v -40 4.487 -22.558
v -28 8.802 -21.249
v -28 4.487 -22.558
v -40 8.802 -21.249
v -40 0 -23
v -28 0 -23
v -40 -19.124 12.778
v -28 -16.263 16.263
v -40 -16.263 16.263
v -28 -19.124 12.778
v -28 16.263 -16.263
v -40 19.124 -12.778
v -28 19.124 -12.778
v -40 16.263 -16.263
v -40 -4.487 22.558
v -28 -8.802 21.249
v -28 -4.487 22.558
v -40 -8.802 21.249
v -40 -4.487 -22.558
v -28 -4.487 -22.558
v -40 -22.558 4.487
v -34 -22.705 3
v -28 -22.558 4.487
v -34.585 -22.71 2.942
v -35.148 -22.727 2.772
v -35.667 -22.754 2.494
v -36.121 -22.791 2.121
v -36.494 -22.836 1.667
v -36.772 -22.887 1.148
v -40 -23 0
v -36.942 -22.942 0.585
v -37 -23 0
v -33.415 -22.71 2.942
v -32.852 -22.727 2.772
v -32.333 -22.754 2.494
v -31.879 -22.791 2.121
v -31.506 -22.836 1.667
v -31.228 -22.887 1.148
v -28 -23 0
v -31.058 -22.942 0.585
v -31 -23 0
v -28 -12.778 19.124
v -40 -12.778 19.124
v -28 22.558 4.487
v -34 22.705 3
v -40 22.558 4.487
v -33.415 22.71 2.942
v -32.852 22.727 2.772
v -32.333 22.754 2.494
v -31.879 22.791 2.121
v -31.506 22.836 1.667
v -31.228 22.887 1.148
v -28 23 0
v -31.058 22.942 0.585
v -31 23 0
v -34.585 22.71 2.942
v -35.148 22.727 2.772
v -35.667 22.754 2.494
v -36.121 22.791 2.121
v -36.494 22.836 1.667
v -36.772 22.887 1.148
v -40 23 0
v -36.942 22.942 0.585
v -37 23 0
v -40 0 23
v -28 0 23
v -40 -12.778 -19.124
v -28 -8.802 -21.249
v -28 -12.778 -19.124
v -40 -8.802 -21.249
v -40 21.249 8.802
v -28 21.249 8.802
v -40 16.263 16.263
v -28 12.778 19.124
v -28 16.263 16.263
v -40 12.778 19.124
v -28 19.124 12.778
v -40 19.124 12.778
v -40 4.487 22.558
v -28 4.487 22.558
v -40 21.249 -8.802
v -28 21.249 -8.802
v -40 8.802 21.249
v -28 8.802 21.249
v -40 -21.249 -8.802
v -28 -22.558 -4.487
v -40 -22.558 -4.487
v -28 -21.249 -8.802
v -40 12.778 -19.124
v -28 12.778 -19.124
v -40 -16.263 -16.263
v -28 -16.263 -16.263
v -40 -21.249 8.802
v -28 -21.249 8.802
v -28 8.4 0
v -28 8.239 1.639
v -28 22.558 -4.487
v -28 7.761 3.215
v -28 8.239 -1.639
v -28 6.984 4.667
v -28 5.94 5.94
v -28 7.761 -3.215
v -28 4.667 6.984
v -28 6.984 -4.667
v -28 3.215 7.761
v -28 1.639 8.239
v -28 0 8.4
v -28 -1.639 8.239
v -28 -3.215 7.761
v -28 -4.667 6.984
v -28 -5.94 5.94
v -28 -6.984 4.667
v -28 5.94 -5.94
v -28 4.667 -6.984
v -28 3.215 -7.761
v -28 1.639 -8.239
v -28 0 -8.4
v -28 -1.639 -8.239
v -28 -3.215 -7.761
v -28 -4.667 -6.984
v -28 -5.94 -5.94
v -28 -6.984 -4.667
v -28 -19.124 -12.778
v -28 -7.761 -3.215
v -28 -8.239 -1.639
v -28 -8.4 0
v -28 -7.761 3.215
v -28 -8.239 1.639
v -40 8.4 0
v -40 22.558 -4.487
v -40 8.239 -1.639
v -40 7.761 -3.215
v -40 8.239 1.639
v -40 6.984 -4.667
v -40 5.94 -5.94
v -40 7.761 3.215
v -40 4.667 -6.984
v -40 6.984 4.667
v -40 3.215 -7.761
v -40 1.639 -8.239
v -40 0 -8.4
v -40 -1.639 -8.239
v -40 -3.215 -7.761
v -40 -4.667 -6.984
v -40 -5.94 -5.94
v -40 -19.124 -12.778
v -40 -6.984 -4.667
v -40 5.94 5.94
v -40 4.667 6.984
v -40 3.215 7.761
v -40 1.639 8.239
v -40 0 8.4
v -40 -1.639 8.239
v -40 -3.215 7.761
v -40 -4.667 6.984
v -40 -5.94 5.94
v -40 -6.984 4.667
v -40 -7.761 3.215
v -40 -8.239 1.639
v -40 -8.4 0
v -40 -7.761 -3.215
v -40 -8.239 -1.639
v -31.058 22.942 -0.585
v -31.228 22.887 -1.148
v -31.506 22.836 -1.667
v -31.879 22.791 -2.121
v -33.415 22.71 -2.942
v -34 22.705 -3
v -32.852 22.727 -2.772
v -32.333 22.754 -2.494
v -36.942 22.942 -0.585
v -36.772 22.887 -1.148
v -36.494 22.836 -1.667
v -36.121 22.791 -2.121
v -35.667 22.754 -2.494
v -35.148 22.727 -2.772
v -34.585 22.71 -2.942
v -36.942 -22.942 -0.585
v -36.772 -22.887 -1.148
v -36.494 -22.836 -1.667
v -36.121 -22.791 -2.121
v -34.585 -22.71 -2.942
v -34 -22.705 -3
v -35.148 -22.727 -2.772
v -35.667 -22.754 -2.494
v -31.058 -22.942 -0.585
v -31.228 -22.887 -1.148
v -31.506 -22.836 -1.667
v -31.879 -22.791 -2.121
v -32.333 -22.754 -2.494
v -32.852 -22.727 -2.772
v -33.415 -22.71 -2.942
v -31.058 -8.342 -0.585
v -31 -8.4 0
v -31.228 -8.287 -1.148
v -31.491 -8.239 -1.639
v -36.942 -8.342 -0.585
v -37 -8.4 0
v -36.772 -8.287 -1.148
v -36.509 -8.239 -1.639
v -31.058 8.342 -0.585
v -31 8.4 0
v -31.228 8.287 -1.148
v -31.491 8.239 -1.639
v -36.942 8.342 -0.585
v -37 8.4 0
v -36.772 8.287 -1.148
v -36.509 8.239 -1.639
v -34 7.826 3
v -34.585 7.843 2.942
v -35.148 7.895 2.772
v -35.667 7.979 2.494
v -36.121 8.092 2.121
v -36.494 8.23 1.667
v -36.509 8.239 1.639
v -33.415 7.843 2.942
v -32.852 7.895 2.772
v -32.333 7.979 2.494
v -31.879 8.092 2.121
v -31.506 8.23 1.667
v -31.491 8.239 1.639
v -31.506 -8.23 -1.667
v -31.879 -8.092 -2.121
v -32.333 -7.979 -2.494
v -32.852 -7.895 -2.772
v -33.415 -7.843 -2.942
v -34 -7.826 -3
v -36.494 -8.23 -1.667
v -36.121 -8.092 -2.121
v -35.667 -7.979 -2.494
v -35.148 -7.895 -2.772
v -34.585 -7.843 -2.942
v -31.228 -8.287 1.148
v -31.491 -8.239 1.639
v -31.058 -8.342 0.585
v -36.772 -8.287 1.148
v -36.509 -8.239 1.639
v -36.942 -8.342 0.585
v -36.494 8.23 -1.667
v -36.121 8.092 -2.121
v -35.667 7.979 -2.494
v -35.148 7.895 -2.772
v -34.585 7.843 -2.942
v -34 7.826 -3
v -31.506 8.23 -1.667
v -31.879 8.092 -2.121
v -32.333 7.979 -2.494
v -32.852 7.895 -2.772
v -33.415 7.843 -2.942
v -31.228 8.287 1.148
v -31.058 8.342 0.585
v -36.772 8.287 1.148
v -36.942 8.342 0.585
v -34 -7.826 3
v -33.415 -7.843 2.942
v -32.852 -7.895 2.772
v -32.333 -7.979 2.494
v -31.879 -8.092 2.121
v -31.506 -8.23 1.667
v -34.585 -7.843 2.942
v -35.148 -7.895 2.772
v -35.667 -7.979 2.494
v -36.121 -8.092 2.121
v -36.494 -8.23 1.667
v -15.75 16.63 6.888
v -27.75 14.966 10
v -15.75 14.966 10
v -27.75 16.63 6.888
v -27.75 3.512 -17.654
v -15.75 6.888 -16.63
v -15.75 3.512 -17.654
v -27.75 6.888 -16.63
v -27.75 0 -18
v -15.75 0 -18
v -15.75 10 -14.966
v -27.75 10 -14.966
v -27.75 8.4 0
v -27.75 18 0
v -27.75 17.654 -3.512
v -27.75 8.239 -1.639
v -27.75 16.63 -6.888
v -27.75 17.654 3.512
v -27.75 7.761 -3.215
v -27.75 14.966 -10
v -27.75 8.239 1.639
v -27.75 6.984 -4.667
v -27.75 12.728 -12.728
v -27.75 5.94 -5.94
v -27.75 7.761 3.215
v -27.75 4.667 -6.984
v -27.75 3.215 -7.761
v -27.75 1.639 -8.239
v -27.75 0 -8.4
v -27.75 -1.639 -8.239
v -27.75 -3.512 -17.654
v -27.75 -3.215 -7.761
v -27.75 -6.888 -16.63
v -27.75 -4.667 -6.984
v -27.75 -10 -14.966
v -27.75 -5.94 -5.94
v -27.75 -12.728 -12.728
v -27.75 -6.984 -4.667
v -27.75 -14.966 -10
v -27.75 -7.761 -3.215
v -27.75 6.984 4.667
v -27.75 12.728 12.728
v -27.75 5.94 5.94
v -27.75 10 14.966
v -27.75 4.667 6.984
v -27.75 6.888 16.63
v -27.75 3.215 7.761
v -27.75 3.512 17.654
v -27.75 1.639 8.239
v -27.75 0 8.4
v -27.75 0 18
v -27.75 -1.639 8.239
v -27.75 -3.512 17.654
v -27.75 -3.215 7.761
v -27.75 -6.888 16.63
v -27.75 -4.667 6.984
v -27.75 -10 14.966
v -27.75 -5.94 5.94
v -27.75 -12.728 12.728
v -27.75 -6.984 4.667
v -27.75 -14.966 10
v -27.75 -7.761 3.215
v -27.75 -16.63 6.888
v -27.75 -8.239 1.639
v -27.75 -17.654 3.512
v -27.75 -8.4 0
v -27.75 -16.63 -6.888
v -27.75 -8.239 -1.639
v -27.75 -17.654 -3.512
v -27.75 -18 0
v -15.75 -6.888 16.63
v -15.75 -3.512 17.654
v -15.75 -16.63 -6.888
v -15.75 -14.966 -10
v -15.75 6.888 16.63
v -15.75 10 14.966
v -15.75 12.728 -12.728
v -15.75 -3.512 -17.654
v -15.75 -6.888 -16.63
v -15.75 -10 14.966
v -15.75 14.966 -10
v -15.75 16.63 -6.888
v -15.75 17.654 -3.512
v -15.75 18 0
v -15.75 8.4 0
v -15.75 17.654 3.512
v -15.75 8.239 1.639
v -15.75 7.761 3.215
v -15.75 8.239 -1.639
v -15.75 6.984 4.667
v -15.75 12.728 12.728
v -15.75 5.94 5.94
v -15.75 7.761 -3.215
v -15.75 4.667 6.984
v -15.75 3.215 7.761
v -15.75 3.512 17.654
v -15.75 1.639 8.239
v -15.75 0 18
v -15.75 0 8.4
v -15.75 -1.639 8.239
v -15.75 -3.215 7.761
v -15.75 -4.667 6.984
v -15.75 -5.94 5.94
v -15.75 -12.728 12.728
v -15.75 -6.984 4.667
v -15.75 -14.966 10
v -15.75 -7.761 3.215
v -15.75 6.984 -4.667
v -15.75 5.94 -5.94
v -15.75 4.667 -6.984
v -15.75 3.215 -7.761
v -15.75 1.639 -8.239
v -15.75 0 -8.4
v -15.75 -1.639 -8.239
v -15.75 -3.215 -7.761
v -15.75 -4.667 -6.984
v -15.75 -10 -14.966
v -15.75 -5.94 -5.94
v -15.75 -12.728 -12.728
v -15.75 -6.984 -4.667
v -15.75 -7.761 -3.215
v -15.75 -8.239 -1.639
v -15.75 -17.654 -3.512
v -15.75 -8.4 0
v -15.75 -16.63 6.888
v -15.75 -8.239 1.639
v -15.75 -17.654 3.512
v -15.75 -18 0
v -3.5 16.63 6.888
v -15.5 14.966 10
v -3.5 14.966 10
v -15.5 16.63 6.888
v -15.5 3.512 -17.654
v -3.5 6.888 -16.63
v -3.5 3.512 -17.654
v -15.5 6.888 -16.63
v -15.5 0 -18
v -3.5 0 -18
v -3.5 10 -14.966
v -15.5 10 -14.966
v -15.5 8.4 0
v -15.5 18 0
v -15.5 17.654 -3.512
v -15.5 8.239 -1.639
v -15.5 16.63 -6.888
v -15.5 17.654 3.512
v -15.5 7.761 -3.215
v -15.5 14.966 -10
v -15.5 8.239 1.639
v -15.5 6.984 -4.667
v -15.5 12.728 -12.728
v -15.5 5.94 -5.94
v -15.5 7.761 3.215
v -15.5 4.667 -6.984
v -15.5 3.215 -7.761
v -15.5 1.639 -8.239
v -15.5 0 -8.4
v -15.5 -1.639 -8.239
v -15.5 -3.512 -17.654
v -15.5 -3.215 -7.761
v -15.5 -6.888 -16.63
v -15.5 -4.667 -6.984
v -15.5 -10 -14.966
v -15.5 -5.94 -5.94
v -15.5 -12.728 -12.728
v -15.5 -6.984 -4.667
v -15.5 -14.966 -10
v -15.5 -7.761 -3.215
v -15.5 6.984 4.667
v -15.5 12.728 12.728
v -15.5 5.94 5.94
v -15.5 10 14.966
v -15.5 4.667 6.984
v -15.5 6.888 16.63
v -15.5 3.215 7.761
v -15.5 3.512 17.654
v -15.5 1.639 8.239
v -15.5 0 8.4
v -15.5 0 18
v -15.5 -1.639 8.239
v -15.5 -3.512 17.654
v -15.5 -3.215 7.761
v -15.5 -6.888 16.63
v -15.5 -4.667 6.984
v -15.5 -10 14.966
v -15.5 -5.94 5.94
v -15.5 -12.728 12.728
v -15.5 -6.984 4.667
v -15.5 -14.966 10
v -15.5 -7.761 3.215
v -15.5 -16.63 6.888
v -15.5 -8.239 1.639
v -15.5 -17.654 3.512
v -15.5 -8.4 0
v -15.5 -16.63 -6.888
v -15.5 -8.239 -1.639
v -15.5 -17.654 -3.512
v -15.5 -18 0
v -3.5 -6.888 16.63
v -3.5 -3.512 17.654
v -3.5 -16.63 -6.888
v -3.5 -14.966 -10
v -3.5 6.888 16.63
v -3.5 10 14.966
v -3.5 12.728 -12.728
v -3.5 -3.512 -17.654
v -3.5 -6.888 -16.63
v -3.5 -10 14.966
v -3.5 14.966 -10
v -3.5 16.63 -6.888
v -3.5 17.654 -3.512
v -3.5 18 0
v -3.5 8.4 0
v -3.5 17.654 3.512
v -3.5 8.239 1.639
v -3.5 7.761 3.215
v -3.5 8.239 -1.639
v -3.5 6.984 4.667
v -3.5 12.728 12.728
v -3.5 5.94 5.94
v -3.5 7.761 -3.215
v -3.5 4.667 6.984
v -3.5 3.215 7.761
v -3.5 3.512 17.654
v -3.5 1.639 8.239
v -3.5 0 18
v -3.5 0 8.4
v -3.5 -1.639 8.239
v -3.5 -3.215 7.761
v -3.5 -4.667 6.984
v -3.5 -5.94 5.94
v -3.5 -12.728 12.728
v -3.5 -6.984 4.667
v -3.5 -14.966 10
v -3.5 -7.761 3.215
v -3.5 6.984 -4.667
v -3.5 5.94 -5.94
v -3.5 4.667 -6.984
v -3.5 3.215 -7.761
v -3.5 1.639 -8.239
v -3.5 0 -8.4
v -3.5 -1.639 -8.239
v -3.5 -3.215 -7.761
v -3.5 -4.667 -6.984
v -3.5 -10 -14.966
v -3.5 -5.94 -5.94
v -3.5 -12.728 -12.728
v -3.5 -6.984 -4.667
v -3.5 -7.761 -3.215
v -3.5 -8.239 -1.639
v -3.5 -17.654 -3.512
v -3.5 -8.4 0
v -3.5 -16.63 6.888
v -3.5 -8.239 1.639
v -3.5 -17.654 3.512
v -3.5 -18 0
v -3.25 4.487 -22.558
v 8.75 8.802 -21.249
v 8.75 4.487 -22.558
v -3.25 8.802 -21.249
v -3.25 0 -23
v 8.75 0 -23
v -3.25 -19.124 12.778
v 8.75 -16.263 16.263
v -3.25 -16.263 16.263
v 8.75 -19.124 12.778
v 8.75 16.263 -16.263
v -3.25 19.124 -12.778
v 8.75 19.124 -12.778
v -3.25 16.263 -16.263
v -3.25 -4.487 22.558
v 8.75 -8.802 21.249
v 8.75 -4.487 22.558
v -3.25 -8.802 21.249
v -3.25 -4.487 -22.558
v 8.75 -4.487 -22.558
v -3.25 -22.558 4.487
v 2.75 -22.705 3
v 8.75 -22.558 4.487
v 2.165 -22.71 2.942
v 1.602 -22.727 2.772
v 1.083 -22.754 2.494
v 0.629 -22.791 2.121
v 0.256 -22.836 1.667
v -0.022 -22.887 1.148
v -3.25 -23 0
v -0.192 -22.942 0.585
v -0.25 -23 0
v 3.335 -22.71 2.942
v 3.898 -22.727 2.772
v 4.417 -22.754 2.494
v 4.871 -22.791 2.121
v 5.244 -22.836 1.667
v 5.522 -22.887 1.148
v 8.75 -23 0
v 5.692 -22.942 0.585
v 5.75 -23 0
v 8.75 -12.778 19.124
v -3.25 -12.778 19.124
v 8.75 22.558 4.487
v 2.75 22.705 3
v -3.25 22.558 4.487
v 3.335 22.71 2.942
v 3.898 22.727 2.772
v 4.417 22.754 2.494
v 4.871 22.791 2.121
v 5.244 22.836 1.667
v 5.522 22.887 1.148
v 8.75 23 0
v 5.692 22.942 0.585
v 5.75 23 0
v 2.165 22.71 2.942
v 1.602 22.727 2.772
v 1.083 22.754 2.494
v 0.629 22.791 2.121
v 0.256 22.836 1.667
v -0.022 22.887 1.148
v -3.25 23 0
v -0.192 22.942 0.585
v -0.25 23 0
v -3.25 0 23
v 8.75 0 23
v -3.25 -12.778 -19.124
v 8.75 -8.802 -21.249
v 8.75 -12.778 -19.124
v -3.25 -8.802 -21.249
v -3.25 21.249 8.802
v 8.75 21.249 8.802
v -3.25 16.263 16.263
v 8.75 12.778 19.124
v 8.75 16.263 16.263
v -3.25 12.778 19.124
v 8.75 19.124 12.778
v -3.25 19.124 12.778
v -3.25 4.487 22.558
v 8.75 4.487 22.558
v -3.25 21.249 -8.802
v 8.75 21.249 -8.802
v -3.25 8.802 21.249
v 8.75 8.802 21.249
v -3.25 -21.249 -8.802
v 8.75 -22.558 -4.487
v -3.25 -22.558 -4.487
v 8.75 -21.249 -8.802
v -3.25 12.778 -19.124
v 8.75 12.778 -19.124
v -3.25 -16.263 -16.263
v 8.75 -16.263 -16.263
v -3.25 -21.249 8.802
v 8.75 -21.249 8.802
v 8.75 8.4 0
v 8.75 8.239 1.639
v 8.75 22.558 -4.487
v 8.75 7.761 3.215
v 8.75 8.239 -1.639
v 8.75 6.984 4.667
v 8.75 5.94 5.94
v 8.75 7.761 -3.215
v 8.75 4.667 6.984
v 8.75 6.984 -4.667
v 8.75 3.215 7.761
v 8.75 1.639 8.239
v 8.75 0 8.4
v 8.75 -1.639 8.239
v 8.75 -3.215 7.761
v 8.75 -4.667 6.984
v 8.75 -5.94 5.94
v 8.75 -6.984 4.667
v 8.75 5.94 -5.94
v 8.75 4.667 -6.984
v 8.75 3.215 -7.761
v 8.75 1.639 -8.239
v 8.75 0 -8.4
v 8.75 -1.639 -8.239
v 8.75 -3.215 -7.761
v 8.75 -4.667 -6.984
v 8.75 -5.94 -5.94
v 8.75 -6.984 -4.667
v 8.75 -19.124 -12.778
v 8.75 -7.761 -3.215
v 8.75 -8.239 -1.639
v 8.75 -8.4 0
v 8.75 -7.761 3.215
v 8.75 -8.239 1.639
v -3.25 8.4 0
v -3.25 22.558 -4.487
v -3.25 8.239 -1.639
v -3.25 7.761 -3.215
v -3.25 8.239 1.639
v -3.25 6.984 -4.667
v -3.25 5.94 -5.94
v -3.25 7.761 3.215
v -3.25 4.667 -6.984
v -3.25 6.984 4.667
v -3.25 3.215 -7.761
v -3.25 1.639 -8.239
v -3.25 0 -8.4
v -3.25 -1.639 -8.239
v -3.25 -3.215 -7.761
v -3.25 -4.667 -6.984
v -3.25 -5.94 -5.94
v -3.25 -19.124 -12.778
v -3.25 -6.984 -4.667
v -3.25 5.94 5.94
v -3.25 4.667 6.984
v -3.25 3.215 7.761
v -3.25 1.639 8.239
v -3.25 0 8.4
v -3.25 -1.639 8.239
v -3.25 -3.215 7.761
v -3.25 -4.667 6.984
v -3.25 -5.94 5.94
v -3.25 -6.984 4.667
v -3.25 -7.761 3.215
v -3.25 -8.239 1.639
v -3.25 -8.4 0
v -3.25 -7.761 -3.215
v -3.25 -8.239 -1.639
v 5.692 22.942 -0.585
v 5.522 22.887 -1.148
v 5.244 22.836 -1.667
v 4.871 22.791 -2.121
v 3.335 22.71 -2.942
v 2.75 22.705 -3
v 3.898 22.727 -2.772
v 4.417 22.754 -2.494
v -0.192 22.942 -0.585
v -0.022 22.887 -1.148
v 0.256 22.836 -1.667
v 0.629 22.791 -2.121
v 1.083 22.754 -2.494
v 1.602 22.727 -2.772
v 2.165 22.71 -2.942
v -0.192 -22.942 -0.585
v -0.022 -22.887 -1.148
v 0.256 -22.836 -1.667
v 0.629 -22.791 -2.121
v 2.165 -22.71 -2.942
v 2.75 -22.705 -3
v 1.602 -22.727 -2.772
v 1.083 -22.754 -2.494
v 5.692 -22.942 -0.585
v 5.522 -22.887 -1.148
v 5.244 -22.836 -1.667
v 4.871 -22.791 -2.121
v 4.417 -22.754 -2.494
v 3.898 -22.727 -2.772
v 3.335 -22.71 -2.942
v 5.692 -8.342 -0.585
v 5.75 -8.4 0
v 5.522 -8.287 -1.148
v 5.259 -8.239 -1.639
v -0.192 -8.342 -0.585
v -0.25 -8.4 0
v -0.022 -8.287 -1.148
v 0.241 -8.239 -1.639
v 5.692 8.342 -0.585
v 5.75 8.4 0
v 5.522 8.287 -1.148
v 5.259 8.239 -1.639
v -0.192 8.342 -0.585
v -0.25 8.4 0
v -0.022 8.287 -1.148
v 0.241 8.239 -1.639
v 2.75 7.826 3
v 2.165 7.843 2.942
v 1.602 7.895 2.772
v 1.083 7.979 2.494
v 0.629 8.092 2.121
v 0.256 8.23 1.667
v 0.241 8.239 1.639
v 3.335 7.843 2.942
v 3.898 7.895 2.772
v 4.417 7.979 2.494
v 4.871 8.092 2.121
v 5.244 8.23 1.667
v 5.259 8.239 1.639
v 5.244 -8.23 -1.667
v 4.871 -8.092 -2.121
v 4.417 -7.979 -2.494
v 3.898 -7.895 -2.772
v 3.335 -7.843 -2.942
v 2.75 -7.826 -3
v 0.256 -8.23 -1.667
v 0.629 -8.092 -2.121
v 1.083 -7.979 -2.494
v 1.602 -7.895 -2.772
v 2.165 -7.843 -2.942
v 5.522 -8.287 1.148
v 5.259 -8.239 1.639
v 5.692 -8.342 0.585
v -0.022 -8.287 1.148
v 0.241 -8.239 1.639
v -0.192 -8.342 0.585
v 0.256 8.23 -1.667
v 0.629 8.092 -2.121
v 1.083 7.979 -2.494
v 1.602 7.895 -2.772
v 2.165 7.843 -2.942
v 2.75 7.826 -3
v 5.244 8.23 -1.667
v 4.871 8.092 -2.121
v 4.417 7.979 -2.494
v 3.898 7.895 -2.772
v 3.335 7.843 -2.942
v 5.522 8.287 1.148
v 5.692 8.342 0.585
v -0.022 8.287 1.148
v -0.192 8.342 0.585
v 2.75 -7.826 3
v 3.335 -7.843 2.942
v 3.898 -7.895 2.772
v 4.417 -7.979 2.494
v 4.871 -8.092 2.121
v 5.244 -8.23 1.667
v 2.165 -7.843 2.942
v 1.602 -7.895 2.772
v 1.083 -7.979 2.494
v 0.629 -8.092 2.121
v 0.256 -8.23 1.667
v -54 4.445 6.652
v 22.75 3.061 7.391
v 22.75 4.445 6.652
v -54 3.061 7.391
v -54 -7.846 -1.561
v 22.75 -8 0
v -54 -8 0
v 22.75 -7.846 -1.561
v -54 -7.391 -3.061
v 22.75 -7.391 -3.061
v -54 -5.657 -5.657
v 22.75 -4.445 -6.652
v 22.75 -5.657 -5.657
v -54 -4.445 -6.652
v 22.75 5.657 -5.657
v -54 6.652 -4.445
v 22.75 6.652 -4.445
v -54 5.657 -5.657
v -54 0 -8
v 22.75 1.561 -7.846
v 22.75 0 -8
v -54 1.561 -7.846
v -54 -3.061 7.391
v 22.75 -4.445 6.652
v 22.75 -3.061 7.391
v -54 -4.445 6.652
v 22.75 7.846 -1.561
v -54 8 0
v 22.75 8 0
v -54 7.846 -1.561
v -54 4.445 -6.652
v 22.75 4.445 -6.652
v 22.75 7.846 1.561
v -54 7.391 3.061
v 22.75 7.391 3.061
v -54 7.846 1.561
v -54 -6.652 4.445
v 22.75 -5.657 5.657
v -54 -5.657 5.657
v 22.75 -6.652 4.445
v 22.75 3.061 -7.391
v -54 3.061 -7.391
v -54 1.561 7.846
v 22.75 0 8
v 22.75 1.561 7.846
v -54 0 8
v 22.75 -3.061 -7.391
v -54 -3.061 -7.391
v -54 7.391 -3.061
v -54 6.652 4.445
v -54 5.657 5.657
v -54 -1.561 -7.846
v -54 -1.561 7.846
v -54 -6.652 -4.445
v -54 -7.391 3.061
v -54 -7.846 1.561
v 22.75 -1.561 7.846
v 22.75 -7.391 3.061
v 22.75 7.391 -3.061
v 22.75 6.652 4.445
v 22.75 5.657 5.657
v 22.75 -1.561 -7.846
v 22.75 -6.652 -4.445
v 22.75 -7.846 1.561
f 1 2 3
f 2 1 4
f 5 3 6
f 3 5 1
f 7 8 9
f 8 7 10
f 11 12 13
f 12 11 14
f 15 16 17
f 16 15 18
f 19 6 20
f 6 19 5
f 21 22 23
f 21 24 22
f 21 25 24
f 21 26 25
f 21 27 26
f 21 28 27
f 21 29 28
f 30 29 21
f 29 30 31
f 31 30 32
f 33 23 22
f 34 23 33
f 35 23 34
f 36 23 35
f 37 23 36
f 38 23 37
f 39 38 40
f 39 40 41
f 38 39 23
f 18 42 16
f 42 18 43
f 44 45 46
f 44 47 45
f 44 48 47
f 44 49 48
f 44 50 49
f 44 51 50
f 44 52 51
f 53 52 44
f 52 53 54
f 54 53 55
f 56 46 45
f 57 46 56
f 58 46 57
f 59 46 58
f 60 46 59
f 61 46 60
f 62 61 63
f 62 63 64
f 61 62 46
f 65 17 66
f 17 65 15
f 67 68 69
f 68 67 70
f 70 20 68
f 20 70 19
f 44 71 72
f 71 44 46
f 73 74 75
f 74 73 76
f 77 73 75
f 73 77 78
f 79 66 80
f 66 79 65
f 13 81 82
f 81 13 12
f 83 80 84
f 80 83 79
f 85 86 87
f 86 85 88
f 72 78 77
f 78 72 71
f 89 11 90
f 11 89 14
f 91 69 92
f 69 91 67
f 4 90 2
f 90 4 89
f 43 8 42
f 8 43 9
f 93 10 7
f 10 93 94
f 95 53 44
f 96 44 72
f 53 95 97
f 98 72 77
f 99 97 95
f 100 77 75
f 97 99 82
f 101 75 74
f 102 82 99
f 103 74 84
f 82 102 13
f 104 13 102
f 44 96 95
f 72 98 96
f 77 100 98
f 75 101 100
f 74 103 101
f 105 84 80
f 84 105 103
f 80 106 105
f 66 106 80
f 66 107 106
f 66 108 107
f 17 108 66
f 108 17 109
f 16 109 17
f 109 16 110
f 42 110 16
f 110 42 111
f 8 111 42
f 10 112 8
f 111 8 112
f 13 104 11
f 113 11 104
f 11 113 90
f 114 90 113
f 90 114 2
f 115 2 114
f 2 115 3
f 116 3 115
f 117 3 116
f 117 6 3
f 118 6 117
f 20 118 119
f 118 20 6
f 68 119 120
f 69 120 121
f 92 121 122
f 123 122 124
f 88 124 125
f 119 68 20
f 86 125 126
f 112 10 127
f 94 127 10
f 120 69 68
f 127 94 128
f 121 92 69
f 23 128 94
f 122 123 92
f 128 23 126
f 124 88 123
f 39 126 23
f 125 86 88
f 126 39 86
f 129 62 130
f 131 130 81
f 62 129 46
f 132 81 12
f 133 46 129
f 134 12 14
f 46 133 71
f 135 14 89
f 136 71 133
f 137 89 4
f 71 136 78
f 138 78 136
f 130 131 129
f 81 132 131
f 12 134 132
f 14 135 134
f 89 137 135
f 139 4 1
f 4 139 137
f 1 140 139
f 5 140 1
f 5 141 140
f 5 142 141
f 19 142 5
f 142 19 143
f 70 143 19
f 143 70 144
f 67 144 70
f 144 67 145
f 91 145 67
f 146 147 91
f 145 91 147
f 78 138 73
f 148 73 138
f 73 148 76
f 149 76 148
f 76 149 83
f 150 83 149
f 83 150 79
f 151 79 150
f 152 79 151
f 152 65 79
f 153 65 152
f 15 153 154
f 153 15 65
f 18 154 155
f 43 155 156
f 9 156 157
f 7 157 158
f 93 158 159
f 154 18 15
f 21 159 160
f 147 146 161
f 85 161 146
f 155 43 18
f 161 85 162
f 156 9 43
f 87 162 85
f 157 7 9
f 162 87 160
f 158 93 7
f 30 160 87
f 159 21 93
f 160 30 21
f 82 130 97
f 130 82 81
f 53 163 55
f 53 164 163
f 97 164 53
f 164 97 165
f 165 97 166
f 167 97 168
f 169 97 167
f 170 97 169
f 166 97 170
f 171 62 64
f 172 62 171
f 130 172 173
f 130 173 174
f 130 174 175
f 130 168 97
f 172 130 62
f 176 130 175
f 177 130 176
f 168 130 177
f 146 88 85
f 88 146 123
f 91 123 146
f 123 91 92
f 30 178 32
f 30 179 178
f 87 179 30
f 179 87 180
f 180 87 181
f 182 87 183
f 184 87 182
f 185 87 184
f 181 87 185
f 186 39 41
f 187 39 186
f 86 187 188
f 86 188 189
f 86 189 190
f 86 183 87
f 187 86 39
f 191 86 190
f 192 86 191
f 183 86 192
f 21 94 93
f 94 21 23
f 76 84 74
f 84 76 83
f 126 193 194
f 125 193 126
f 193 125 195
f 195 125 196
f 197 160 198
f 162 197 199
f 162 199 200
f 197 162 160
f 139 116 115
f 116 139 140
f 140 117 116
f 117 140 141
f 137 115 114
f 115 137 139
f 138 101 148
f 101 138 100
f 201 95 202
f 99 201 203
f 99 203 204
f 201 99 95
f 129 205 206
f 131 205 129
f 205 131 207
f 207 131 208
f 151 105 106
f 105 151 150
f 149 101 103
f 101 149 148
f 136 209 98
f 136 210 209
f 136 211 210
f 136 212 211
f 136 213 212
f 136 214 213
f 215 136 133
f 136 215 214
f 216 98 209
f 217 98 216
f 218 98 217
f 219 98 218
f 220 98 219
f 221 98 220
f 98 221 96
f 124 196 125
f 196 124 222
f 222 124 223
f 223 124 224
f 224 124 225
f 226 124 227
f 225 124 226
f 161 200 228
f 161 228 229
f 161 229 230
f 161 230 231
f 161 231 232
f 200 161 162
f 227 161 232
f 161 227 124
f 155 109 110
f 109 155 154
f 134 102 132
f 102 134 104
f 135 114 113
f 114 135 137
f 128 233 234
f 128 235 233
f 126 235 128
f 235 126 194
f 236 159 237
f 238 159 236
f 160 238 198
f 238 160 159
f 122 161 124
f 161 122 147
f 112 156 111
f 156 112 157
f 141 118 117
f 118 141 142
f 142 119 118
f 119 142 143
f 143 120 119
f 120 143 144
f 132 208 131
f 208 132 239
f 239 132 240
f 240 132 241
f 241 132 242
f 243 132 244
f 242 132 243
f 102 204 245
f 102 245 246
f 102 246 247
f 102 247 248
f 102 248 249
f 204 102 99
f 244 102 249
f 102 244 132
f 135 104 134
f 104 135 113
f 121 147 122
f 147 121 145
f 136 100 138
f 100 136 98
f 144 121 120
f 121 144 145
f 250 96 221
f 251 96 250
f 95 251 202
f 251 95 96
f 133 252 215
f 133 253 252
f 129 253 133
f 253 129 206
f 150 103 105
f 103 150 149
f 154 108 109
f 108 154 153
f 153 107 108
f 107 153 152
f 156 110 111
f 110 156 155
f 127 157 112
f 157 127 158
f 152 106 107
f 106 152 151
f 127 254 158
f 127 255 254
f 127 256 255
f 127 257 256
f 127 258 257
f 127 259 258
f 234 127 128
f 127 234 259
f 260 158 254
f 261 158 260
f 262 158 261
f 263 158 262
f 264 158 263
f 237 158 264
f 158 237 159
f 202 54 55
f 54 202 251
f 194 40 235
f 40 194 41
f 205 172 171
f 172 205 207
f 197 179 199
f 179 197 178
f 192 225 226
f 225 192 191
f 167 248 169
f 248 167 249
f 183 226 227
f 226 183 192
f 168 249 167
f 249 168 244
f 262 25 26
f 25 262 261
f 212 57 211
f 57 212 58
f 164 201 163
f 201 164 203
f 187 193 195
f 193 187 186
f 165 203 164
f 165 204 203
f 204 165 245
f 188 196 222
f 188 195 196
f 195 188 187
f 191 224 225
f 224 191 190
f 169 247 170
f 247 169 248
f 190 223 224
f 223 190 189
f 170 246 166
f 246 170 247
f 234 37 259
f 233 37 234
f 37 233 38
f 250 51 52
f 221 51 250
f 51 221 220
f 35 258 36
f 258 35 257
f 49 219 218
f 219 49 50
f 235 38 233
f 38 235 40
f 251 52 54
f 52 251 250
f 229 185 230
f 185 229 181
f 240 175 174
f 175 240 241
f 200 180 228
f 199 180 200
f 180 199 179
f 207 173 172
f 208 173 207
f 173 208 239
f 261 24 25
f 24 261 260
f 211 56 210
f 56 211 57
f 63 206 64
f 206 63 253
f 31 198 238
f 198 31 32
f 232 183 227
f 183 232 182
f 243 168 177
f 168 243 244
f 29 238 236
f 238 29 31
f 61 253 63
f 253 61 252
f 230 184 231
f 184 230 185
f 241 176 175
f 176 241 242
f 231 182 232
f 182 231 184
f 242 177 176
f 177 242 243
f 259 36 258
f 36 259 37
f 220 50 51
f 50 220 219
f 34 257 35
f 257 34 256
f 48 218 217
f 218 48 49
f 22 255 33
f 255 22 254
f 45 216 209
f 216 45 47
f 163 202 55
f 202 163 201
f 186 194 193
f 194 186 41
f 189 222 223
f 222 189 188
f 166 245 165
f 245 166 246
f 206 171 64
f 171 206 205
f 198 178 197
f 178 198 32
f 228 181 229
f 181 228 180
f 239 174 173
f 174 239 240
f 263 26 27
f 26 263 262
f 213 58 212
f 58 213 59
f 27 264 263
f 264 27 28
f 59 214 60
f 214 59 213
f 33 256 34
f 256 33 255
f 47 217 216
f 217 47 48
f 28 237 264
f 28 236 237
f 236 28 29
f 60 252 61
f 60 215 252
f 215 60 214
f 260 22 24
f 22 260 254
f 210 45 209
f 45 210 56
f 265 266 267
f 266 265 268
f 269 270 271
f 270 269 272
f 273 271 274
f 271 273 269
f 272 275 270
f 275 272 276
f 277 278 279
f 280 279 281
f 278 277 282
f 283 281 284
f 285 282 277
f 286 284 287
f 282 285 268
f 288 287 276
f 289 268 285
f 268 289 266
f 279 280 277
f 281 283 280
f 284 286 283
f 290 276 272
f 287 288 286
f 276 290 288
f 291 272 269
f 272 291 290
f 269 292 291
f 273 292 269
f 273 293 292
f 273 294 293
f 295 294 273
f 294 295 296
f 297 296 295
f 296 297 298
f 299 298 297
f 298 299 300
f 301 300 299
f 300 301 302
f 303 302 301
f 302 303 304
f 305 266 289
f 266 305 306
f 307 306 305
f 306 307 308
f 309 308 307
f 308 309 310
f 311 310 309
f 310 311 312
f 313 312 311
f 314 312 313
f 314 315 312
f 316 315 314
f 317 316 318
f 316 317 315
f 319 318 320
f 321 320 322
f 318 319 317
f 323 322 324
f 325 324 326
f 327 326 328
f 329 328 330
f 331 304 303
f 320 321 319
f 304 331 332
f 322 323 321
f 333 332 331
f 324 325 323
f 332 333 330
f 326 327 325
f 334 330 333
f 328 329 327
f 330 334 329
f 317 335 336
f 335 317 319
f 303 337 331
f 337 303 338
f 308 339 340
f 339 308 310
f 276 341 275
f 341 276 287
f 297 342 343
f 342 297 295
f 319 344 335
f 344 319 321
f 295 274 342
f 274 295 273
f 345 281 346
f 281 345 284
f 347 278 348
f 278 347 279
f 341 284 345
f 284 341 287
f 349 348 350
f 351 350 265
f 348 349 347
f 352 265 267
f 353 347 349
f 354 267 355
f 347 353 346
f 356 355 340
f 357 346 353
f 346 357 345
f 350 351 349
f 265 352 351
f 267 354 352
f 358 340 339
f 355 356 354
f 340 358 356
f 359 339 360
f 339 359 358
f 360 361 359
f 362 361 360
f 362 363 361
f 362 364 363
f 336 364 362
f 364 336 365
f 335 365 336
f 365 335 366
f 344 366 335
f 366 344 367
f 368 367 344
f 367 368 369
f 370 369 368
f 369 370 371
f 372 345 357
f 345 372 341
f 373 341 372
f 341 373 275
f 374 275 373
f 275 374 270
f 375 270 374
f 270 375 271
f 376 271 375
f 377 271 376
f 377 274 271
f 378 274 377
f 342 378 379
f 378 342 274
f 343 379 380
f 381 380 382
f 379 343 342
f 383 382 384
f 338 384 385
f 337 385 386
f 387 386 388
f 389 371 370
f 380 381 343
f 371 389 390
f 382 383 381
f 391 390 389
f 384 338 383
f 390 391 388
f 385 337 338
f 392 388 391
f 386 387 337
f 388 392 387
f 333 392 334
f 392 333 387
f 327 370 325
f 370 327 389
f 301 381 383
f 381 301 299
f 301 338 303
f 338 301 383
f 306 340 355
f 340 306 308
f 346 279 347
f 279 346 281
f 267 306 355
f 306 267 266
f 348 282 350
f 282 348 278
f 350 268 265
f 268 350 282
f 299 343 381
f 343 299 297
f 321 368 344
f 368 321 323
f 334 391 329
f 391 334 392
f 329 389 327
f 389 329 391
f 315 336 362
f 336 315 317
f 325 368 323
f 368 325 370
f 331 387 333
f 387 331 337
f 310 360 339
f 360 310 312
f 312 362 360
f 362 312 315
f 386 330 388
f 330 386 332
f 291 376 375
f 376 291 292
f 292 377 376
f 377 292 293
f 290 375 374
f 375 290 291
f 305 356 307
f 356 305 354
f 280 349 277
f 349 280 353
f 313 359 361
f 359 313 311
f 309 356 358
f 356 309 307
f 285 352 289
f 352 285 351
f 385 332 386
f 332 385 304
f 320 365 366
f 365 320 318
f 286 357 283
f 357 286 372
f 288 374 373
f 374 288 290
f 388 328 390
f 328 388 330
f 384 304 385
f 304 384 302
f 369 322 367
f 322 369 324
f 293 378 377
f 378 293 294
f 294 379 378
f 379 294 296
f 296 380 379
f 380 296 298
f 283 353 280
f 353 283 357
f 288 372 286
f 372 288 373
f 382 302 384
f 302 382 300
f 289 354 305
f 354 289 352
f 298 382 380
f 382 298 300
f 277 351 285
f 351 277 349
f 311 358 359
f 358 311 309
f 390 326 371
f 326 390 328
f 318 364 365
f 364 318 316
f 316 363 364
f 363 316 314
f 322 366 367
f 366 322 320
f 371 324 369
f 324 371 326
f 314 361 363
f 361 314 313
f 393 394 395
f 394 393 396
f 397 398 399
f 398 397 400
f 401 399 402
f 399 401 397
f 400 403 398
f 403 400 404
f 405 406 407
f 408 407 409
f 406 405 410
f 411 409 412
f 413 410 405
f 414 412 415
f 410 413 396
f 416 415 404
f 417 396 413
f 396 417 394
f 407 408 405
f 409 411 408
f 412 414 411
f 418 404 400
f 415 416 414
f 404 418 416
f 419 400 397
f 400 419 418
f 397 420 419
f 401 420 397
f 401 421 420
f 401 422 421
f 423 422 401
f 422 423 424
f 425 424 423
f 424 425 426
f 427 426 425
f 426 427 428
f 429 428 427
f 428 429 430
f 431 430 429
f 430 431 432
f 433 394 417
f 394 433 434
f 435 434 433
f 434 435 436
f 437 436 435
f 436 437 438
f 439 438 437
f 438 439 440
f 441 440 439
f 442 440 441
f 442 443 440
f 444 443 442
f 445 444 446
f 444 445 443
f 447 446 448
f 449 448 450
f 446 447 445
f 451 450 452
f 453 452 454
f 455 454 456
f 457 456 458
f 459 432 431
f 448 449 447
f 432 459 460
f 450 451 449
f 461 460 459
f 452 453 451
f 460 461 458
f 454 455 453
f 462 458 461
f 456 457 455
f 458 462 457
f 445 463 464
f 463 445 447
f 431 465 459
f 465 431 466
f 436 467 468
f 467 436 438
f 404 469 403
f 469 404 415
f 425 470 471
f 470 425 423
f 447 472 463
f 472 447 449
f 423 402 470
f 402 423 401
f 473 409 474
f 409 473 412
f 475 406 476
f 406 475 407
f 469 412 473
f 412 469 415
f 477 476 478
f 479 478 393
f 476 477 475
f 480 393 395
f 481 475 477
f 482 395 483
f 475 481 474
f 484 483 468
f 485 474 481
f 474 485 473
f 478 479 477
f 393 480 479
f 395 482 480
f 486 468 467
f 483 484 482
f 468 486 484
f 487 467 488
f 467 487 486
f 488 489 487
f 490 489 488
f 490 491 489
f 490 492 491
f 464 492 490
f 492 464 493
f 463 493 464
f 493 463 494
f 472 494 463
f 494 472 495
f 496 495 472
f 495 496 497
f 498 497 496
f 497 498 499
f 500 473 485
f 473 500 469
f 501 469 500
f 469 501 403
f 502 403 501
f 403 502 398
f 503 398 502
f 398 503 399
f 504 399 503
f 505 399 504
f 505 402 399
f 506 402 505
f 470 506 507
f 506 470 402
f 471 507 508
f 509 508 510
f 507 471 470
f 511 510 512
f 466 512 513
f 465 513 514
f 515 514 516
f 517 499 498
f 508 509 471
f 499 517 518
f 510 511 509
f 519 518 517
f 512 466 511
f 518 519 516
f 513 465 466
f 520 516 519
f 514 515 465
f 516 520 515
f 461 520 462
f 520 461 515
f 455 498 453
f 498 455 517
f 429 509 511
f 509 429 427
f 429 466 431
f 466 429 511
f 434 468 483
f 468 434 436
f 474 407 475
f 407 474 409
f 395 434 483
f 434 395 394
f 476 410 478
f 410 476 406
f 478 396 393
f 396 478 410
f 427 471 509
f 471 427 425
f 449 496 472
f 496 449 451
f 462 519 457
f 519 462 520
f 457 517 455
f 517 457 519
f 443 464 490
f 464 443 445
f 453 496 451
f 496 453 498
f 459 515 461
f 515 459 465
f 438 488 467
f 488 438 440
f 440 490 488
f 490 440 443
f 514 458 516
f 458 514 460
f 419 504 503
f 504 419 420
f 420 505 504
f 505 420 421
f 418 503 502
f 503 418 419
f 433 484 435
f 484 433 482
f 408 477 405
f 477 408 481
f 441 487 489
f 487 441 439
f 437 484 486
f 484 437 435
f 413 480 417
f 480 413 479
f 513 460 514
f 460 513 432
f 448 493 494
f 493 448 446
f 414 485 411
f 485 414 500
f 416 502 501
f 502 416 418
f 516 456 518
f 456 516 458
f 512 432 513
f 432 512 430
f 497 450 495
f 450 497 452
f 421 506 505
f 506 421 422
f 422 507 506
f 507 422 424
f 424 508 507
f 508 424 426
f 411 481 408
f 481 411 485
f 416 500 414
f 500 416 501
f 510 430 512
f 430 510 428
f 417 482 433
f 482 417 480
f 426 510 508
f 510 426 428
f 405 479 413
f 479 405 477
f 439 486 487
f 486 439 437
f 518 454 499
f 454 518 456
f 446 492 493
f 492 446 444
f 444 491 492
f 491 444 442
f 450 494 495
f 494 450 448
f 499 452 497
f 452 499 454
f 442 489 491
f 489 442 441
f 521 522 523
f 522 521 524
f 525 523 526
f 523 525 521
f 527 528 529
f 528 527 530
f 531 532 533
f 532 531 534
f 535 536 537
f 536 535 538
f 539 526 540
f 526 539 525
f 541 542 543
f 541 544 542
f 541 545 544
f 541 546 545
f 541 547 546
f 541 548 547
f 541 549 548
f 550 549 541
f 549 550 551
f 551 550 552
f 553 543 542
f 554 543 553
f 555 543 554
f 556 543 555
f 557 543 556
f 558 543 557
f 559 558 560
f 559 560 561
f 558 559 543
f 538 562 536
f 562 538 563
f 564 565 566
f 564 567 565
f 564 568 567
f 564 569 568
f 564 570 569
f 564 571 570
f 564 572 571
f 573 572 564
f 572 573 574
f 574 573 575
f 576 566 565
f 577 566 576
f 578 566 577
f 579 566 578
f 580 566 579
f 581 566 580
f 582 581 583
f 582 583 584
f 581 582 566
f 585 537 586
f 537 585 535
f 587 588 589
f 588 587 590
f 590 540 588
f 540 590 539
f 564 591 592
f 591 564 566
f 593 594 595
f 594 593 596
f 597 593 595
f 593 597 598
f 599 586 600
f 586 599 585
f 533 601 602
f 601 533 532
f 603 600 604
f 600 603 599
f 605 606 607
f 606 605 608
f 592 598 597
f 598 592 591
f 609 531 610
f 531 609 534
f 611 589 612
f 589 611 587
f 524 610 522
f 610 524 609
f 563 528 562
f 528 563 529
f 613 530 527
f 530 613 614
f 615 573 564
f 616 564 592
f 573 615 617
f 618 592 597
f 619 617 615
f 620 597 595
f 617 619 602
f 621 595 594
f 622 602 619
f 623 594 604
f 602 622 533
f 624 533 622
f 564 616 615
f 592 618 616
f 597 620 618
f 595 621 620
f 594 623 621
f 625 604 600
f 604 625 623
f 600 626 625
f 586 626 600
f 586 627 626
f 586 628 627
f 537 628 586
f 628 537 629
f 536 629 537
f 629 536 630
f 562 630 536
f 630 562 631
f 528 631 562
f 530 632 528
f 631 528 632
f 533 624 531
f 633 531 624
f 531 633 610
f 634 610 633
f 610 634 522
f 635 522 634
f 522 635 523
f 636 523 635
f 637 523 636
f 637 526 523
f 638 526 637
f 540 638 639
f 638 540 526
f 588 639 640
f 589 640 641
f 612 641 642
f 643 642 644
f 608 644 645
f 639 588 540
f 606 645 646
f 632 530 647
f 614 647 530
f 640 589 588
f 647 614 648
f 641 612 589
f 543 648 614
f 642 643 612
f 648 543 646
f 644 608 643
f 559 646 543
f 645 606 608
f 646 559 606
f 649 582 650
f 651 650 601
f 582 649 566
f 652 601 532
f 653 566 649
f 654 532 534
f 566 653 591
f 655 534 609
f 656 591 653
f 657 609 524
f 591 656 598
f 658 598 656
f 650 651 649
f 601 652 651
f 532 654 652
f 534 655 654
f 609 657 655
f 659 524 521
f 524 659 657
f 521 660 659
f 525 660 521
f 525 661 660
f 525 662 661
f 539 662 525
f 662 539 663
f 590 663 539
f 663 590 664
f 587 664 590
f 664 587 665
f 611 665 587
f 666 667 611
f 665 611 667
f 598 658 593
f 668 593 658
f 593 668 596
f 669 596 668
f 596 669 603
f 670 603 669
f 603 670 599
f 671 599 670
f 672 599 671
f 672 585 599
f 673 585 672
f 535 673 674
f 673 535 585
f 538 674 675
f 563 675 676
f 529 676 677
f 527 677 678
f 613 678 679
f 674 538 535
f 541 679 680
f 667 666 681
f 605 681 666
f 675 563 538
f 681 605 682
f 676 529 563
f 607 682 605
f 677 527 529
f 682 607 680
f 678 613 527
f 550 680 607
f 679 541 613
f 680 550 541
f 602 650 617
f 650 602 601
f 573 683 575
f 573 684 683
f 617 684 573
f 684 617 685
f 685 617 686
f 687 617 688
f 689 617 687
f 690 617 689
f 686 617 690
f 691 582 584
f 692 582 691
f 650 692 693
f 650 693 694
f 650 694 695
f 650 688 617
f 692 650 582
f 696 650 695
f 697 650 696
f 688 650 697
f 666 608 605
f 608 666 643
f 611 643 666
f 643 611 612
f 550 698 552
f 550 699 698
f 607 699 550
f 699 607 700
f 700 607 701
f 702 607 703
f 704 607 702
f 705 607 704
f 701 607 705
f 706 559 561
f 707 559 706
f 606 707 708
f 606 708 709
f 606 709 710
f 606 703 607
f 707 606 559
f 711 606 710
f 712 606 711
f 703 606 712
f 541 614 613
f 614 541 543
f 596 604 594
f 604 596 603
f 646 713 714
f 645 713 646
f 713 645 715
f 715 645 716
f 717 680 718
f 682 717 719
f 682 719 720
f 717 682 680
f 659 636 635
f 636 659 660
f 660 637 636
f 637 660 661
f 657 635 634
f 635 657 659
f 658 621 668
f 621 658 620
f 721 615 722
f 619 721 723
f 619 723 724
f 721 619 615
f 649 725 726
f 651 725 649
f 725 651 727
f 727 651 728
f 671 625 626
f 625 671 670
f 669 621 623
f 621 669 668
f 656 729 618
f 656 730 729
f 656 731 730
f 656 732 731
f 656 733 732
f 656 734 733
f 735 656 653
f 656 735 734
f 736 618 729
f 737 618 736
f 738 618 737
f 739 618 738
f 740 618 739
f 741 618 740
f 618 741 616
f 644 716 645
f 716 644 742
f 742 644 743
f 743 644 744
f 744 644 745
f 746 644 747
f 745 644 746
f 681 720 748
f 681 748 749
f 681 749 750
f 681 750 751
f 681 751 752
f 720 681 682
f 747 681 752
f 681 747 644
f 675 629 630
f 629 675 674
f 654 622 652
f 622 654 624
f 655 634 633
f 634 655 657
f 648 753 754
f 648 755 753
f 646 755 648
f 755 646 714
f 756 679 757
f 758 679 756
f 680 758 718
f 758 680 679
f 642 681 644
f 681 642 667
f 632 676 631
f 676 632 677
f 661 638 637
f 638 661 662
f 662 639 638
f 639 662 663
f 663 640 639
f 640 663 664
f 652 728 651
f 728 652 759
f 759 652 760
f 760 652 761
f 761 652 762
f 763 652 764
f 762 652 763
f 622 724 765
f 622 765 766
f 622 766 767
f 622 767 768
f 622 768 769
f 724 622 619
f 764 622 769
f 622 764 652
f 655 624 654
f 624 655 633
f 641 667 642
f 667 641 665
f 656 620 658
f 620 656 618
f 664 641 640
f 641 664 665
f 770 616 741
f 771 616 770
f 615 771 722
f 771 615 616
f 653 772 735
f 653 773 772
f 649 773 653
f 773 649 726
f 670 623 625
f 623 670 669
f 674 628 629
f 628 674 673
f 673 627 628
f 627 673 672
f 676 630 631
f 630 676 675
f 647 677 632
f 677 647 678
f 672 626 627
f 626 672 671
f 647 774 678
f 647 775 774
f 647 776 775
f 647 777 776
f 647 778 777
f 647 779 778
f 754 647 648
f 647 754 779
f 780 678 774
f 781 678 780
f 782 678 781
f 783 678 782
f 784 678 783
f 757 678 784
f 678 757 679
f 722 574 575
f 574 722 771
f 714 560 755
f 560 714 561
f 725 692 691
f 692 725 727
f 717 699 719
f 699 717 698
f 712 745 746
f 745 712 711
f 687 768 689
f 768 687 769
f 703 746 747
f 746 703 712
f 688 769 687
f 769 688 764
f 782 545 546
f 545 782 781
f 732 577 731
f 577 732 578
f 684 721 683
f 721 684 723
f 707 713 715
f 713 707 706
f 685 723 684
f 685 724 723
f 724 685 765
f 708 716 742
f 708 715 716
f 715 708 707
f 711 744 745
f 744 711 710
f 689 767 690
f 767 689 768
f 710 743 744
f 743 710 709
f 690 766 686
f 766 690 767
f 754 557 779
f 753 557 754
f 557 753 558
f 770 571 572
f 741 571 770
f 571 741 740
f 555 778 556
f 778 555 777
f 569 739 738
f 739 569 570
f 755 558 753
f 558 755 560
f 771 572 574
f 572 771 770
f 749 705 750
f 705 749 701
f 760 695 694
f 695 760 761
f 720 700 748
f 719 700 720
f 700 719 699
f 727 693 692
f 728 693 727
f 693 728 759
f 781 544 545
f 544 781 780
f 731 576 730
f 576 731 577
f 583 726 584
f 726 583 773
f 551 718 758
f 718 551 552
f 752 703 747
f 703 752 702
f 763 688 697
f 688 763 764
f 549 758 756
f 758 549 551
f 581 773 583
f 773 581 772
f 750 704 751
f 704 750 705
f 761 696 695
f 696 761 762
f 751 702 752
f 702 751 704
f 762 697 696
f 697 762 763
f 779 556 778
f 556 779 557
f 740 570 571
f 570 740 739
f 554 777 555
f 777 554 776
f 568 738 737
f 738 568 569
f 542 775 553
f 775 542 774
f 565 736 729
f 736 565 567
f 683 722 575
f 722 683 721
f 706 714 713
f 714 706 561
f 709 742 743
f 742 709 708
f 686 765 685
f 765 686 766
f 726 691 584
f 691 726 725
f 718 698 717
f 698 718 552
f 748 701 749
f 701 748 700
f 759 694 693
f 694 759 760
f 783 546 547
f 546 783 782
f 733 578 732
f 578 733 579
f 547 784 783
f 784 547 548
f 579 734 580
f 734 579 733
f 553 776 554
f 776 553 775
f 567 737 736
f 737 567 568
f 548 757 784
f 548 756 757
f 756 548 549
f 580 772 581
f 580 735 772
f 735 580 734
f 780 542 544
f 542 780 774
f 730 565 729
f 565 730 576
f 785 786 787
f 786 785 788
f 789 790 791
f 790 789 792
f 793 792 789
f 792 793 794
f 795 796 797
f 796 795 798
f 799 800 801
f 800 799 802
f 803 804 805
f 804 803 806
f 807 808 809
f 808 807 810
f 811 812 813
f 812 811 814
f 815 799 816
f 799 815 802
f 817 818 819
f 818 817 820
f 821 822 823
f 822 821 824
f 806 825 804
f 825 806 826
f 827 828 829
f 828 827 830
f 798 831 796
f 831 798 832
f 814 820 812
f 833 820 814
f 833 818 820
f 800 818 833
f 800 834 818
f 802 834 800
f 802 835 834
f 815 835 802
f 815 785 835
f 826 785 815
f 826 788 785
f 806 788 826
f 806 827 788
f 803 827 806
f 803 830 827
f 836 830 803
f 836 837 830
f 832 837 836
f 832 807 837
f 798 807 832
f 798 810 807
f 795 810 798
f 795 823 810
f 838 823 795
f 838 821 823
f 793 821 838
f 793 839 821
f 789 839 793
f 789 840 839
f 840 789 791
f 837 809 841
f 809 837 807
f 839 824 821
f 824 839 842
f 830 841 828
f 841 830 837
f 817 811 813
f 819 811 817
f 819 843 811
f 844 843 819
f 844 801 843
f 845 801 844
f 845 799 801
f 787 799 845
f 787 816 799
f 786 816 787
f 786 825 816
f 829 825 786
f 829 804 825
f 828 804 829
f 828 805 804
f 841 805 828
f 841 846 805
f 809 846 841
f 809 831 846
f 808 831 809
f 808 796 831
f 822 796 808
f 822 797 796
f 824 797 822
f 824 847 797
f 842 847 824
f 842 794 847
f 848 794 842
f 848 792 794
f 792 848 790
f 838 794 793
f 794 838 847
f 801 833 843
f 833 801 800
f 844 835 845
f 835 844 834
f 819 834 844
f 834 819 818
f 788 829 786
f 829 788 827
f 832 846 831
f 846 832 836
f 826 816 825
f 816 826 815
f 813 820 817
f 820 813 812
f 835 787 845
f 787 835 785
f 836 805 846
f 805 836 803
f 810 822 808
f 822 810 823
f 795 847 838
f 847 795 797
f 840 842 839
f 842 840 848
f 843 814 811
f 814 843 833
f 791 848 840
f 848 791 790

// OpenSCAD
$fn = 32;

// ------------------------------------------------------------------------
// Shaft with rings and collars: d16 shaft, 4 rings
// Every part is its own module, assembly() places them once.
// ------------------------------------------------------------------------

// --- part 1 ---
module shaft() {
  translate([0, 0, -38.375]) cylinder(h = 76.75, d = 16);
}

// --- part 2 ---
module collar_a() {
  difference() {
    cylinder(h = 12, d = 46);
    translate([0, 0, -1]) cylinder(h = 14, d = 16.8);
    translate([0, 0, 6]) rotate([90, 0, 0]) cylinder(h = 48, d = 6, center = true);
  }
}

// --- part 3 ---
module spacer_a() {
  difference() {
      translate([0, 0, 0]) cylinder(h = 12, d = 36);
      translate([0, 0, -1]) cylinder(h = 14, d = 16.8);
    }
}

// --- part 4 ---
module spacer_b() {
  difference() {
      translate([0, 0, 0]) cylinder(h = 12, d = 36);
      translate([0, 0, -1]) cylinder(h = 14, d = 16.8);
    }
}

// --- part 5 ---
module collar_b() {
  difference() {
    cylinder(h = 12, d = 46);
    translate([0, 0, -1]) cylinder(h = 14, d = 16.8);
    translate([0, 0, 6]) rotate([90, 0, 0]) cylinder(h = 48, d = 6, center = true);
  }
}

// --- assembly ---
module assembly() {
  translate([-15.625, 0, 0]) rotate([0, 90, 0]) shaft();
  translate([-40, 0, 0]) rotate([0, 90, 0]) collar_a();
  translate([-27.75, 0, 0]) rotate([0, 90, 0]) spacer_a();
  translate([-15.5, 0, 0]) rotate([0, 90, 0]) spacer_b();
  translate([-3.25, 0, 0]) rotate([0, 90, 0]) collar_b();
}

assembly();
